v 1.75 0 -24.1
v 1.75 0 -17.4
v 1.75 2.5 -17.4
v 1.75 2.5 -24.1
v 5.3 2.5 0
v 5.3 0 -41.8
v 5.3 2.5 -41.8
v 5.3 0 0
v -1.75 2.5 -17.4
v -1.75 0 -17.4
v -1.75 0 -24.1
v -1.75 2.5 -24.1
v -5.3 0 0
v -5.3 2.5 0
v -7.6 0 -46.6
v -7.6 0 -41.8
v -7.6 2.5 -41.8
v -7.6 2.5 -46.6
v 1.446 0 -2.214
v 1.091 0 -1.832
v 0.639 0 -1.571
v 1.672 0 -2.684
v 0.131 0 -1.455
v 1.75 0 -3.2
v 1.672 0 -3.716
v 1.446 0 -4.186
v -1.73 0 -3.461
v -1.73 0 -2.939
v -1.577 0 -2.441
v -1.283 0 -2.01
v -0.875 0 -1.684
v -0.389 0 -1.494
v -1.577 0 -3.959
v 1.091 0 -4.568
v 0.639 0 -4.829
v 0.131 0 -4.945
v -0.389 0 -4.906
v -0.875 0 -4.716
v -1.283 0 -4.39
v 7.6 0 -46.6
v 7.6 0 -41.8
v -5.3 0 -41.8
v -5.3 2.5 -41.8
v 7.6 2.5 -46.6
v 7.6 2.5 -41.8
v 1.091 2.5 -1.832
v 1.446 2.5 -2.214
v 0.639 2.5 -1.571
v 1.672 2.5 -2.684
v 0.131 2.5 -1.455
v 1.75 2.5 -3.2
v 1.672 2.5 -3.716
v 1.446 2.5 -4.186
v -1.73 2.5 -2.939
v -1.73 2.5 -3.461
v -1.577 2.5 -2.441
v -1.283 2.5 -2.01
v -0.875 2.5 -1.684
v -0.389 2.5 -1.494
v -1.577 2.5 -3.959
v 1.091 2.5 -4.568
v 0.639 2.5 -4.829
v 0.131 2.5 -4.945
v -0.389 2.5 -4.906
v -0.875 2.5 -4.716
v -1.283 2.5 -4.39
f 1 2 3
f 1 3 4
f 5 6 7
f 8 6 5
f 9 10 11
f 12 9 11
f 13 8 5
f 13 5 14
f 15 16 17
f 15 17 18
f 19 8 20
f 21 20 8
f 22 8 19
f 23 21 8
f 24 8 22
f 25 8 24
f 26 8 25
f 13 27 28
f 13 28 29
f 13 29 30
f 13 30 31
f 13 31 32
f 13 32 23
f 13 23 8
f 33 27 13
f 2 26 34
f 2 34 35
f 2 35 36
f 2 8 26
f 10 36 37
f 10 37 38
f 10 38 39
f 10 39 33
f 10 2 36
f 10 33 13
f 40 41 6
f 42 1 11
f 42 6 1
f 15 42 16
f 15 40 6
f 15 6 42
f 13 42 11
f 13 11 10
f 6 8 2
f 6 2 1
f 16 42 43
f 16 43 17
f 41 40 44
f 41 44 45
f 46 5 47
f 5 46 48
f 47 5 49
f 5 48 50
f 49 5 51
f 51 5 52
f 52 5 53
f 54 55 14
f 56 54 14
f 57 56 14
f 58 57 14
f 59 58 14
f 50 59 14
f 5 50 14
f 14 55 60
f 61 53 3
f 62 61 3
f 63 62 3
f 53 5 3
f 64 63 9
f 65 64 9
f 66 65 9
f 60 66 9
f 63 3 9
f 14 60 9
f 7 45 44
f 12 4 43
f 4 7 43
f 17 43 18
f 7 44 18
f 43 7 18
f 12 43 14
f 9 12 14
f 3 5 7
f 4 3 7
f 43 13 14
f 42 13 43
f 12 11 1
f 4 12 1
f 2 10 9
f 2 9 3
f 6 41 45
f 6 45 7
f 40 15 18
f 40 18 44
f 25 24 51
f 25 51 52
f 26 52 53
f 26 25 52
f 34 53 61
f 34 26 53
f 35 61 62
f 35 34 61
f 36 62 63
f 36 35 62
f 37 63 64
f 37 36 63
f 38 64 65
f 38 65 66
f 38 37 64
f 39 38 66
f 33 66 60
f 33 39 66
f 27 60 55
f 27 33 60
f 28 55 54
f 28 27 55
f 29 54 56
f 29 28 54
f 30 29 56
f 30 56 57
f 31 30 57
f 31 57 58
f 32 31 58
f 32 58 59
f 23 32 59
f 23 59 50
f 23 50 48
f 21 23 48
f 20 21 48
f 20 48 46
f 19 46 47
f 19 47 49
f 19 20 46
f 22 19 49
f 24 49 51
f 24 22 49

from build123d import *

# Parameters (mm, degrees)
BOSS_EXTRUDE1_DEPTH = 2.5
SKETCH2_R           = 1.75
SKETCH2_W           = 3.5
SKETCH2_H           = 6.7
CUT_EXTRUDE1_DEPTH  = 2.5


with BuildPart() as part:
    # Sketch1 → Boss-Extrude1 (new body)
    with BuildSketch(Plane(origin=(0, 0, 0), x_dir=(1, 0, 0), z_dir=(0, 1, 0))):
        Polygon((5.3, 0), (-5.3, 0), (-5.3, 41.8), (-7.6, 41.8), (-7.6, 46.6), (7.6, 46.6), (7.6, 41.8), (5.3, 41.8), align=None)
    extrude(amount=BOSS_EXTRUDE1_DEPTH)

    # Sketch2 → Cut-Extrude1 (cut)
    with BuildSketch(Plane(origin=(0, 0, 0), x_dir=(1, 0, 0), z_dir=(0, 1, 0))):
        with Locations((0, 3.2)):
            Circle(SKETCH2_R)
        with Locations((0, 20.75)):
            Rectangle(SKETCH2_W, SKETCH2_H)
    extrude(amount=CUT_EXTRUDE1_DEPTH, mode=Mode.SUBTRACT)


solid = part.part
